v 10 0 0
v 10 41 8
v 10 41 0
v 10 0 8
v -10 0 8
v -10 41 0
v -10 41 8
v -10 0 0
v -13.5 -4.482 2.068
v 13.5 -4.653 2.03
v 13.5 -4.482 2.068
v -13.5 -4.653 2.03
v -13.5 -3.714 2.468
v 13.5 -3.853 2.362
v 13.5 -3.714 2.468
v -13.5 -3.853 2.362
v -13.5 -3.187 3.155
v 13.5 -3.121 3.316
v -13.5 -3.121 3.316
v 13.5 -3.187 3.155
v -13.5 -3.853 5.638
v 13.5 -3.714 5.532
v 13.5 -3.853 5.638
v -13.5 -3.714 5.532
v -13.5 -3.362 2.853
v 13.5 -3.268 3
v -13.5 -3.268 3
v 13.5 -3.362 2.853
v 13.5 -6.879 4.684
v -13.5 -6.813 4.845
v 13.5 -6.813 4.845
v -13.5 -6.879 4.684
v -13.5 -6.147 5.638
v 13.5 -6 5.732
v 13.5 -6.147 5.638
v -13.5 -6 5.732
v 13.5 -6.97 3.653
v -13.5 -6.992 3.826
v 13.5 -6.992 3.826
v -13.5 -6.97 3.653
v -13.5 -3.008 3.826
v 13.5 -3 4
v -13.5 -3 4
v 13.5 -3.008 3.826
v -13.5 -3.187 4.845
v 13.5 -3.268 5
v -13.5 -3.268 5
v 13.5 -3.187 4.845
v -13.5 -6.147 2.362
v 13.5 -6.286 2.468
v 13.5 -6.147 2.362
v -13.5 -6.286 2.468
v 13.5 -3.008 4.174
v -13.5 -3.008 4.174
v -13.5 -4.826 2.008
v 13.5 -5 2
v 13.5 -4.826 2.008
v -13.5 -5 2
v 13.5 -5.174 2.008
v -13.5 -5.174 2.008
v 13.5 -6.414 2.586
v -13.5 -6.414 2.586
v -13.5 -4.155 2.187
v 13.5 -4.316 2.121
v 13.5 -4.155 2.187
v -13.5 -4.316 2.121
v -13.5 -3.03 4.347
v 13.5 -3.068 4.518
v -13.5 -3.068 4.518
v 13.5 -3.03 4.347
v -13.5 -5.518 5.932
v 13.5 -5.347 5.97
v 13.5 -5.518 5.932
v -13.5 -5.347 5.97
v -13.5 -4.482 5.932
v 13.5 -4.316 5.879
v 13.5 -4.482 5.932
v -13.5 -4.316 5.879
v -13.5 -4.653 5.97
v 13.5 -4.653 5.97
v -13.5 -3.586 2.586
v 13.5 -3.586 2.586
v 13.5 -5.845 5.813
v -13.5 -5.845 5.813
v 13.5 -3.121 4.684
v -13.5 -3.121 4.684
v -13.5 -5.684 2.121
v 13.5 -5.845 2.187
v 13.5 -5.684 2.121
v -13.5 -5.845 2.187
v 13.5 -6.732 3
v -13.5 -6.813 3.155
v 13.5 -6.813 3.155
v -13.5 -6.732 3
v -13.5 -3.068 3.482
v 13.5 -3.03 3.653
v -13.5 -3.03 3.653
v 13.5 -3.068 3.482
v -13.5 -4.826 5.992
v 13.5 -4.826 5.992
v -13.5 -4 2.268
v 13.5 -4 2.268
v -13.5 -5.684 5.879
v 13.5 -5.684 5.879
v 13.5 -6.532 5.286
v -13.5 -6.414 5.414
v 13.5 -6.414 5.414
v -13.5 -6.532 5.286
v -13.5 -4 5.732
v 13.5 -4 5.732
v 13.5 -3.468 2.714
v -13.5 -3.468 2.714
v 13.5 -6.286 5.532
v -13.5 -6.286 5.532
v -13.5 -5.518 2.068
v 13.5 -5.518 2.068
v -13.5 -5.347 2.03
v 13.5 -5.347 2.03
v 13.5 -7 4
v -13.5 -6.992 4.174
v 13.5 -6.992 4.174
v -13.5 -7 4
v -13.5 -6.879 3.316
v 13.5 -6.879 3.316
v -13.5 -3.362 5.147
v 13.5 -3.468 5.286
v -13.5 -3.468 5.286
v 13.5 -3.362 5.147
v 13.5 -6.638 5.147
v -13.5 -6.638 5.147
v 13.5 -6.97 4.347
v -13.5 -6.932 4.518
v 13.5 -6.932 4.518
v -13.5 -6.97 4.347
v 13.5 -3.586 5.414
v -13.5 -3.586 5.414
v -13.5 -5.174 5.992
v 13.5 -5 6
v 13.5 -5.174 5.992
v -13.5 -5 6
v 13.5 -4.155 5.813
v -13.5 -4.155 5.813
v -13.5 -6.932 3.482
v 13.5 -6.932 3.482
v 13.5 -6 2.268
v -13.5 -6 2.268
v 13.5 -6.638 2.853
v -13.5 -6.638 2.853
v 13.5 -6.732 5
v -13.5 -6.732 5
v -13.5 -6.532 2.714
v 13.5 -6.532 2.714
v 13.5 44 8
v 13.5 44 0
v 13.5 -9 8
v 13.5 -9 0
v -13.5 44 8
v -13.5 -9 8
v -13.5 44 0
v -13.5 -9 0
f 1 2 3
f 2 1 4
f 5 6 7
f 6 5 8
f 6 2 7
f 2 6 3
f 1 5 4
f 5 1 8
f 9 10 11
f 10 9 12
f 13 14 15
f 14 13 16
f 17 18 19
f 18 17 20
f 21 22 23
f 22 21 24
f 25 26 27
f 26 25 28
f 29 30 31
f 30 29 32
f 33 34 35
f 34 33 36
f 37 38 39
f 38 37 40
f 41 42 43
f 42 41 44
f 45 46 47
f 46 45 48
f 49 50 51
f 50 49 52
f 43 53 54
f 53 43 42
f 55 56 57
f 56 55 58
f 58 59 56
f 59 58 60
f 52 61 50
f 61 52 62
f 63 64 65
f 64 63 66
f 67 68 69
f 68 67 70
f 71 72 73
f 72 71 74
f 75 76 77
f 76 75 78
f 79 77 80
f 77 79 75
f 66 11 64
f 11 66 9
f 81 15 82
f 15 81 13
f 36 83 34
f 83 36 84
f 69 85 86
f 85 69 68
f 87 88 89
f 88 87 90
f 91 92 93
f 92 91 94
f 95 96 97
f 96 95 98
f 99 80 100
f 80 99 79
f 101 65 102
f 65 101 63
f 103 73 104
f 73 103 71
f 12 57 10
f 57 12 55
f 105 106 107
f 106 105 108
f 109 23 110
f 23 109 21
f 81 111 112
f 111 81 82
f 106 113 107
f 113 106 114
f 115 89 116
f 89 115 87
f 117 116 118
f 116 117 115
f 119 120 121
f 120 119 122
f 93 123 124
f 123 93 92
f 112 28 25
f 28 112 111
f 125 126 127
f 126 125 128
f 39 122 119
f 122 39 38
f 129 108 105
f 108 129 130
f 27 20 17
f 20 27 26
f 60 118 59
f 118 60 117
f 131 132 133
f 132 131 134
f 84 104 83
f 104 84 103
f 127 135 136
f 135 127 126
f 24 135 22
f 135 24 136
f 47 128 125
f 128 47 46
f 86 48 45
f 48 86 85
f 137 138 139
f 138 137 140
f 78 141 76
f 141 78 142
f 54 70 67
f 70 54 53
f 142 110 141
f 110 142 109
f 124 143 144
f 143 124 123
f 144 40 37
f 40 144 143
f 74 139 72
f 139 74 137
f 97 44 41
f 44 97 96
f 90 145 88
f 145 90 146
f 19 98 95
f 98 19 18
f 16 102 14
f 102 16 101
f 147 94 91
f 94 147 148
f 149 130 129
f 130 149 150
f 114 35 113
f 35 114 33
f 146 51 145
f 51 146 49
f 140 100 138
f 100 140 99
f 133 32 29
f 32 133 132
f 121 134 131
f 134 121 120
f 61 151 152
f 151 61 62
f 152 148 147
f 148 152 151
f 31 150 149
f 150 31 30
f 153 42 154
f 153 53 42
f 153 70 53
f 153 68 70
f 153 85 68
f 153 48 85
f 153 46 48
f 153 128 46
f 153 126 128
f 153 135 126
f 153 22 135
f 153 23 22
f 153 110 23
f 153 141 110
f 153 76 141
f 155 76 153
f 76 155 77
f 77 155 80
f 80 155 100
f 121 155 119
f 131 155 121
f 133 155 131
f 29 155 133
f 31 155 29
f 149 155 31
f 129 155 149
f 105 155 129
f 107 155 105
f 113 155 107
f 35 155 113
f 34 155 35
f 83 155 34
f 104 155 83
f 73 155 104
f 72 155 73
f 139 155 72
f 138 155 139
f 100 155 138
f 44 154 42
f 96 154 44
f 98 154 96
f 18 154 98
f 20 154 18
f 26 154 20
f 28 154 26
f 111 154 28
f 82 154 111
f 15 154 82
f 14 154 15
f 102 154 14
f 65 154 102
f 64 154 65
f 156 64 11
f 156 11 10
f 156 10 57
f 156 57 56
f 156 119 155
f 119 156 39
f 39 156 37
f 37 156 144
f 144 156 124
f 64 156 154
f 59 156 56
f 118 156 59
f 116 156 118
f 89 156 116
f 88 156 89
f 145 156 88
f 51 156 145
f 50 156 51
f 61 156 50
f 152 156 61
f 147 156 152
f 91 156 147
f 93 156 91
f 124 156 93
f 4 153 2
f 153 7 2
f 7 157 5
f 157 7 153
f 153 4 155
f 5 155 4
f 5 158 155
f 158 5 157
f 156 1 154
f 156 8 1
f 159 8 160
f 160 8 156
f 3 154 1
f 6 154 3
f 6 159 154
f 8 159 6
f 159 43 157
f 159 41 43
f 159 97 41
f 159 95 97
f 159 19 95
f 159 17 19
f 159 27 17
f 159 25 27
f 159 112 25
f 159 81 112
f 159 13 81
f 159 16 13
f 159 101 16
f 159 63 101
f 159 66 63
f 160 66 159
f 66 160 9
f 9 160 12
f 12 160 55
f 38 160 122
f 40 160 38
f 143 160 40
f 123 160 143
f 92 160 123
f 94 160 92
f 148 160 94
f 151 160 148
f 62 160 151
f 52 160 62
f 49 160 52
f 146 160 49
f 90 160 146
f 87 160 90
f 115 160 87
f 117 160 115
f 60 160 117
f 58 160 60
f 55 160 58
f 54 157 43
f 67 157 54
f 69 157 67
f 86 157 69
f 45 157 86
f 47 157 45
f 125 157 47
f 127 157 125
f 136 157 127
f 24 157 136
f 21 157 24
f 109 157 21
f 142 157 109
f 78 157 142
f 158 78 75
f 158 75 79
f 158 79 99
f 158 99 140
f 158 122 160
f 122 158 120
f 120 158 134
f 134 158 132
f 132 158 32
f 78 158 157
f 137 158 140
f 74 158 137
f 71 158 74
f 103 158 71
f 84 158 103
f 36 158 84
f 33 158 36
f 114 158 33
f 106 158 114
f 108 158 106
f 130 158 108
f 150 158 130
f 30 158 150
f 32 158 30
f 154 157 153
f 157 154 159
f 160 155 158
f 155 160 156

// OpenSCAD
HolderWidth = 27;
HolderLength = 44;
HolderThickness = 8;

ScrewOffset = -5;
HolderOffset = 4-ScrewOffset;

ServoWidth = 20;
ServoLength = 41;



HoleRadius = 2;
$fn = 72;


WedgeX = 2;
WedgeY = 2;

//Servo();

difference() {
    translate([-HolderWidth/2,-HolderOffset,0])
        cube([HolderWidth,HolderLength+HolderOffset,HolderThickness]);
    
    union () {
        translate([-ServoWidth/2,0,-1])
                cube([ServoWidth,ServoLength,HolderThickness+2]);
        
        translate([0,ScrewOffset,HolderThickness/2])
            rotate([0,90,0])
                translate([0,0,-(HolderWidth+2)/2])
                    cylinder(r=HoleRadius, h=HolderWidth+2);
    }
}

/*
difference() {
    translate([-HolderWidth/2,-HolderOffset,0])
        cube([HolderWidth,HolderOffset+HolderLength,HolderHeight]);
    Servo();
}*/

module Servo() {
    union () {
        translate([-ServoWidth/2,ServoBaseOffset, 0])
        cube([ServoWidth,ServoBaseLength,ServoBaseThickness+1]);

        translate([-ServoWidth/2,ServoMiddleOffset, ServoBaseThickness])
        cube([ServoWidth,ServoMiddleLength,ServoBodyHeight]);

        translate([-ServoWidth/2,-ServoPlateOffset,ServoBaseThickness+ServoMiddleThickness])
        cube([ServoWidth,ServoPlateLength+ServoPlateOffset*2,
              ServoBodyHeight]);
        
        translate([-5,0,0])
            cylinder(r=2,h=ServoBodyHeight);
        translate([5,0,0])
            cylinder(r=2,h=ServoBodyHeight);
        translate([-5,FarScrewOffset,0])
            cylinder(r=2,h=ServoBodyHeight);
        translate([5,FarScrewOffset,0])
            cylinder(r=2,h=ServoBodyHeight);
        translate([0,0,ServoBaseThickness+ServoMiddleThickness])
            rotate([0,90,0])
                translate([0,0,-1])
                    linear_extrude(height=2)
                    polygon([[0,-WedgeX],
                             [WedgeY,ServoMiddleOffset],
                             [0,5]]);
        translate([0,ServoMiddleLength+10,ServoBaseThickness+ServoMiddleThickness])         
            rotate([0,0,180])               
            rotate([0,90,0])
                translate([0,0,-1])
                    linear_extrude(height=2)
                    polygon([[0,-WedgeX],
                             [WedgeY,ServoMiddleOffset],
                             [0,5]]);

    }
}

/*union() {
    translate([-HolderWidth/2,-ServoOverhang,0])
        cube([HolderWidth, ServoOverhang+ServoOffset1, 3]);
    difference() {
        union () {
            translate([-HolderWidth/2, HolderOffset-ServoOverhang, 0])
                cube([HolderWidth, HolderLength+ServoOverhang,
                      HolderHeight]);
        }
        
        union () {
            translate([-ServoWidth/2, ServoOffset1, -1])
                cube([ServoWidth, ServoLength, HolderHeight+2]);
            
            translate([-ServoWidth/2, ServoOffset2, 3])
                cube([ServoWidth, ServoLength, 5]);

            translate([-ServoWidth/2, ServoOffset3, 8])
                cube([ServoWidth, ServoLength, HolderHeight+2]);
            translate([0,0,16])
                rotate([-20,0,0])
                    cube([2,20,20], center=true);

            translate([-5,0,-1])
                cylinder(r=2,h=10);
            translate([5,0,-1])
                cylinder(r=2,h=10);
            
            translate([-HolderWidth/2-1,0,14])
            rotate([0,90,0])
            cylinder(r=2,h=HolderWidth+2);
            
            
        }
        
    }
}
*/
